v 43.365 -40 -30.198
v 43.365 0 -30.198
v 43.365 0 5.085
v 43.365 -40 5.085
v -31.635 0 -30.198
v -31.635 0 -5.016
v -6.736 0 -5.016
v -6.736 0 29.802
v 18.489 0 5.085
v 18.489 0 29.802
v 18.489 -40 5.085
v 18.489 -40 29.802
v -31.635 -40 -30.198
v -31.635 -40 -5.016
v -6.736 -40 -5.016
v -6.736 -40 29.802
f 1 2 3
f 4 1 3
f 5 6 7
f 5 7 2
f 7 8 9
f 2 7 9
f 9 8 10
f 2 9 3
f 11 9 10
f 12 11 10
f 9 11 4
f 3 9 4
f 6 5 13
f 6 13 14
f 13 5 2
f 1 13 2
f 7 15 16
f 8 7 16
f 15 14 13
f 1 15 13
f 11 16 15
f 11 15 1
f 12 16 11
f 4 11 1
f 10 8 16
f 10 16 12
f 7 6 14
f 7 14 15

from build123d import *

# Parameters (mm, degrees)
F0_W     = 75
F0_H     = 60
F1_DEPTH = 40
F2_W     = 25
F2_H     = 35
F2_W_2   = 24.9936
F2_H_2   = 25
F3_DEPTH = 40.001


with BuildPart() as f1:
    # F0 (on Front) → F1 (new body)
    with BuildSketch(Plane.XZ):
        with Locations((5.865399, -0.198499)):
            Rectangle(F0_W, F0_H)
    extrude(amount=F1_DEPTH)

    # F2 (on Front) → F3 (cut, through all)
    with BuildSketch(Plane.XZ):
        with Locations((-19.235718, 12.4838)):
            Rectangle(F2_W, F2_H)
        with Locations((30.985761, 17.584927)):
            Rectangle(F2_W_2, F2_H_2)
    extrude(amount=F3_DEPTH, mode=Mode.SUBTRACT)


solid = f1.part
